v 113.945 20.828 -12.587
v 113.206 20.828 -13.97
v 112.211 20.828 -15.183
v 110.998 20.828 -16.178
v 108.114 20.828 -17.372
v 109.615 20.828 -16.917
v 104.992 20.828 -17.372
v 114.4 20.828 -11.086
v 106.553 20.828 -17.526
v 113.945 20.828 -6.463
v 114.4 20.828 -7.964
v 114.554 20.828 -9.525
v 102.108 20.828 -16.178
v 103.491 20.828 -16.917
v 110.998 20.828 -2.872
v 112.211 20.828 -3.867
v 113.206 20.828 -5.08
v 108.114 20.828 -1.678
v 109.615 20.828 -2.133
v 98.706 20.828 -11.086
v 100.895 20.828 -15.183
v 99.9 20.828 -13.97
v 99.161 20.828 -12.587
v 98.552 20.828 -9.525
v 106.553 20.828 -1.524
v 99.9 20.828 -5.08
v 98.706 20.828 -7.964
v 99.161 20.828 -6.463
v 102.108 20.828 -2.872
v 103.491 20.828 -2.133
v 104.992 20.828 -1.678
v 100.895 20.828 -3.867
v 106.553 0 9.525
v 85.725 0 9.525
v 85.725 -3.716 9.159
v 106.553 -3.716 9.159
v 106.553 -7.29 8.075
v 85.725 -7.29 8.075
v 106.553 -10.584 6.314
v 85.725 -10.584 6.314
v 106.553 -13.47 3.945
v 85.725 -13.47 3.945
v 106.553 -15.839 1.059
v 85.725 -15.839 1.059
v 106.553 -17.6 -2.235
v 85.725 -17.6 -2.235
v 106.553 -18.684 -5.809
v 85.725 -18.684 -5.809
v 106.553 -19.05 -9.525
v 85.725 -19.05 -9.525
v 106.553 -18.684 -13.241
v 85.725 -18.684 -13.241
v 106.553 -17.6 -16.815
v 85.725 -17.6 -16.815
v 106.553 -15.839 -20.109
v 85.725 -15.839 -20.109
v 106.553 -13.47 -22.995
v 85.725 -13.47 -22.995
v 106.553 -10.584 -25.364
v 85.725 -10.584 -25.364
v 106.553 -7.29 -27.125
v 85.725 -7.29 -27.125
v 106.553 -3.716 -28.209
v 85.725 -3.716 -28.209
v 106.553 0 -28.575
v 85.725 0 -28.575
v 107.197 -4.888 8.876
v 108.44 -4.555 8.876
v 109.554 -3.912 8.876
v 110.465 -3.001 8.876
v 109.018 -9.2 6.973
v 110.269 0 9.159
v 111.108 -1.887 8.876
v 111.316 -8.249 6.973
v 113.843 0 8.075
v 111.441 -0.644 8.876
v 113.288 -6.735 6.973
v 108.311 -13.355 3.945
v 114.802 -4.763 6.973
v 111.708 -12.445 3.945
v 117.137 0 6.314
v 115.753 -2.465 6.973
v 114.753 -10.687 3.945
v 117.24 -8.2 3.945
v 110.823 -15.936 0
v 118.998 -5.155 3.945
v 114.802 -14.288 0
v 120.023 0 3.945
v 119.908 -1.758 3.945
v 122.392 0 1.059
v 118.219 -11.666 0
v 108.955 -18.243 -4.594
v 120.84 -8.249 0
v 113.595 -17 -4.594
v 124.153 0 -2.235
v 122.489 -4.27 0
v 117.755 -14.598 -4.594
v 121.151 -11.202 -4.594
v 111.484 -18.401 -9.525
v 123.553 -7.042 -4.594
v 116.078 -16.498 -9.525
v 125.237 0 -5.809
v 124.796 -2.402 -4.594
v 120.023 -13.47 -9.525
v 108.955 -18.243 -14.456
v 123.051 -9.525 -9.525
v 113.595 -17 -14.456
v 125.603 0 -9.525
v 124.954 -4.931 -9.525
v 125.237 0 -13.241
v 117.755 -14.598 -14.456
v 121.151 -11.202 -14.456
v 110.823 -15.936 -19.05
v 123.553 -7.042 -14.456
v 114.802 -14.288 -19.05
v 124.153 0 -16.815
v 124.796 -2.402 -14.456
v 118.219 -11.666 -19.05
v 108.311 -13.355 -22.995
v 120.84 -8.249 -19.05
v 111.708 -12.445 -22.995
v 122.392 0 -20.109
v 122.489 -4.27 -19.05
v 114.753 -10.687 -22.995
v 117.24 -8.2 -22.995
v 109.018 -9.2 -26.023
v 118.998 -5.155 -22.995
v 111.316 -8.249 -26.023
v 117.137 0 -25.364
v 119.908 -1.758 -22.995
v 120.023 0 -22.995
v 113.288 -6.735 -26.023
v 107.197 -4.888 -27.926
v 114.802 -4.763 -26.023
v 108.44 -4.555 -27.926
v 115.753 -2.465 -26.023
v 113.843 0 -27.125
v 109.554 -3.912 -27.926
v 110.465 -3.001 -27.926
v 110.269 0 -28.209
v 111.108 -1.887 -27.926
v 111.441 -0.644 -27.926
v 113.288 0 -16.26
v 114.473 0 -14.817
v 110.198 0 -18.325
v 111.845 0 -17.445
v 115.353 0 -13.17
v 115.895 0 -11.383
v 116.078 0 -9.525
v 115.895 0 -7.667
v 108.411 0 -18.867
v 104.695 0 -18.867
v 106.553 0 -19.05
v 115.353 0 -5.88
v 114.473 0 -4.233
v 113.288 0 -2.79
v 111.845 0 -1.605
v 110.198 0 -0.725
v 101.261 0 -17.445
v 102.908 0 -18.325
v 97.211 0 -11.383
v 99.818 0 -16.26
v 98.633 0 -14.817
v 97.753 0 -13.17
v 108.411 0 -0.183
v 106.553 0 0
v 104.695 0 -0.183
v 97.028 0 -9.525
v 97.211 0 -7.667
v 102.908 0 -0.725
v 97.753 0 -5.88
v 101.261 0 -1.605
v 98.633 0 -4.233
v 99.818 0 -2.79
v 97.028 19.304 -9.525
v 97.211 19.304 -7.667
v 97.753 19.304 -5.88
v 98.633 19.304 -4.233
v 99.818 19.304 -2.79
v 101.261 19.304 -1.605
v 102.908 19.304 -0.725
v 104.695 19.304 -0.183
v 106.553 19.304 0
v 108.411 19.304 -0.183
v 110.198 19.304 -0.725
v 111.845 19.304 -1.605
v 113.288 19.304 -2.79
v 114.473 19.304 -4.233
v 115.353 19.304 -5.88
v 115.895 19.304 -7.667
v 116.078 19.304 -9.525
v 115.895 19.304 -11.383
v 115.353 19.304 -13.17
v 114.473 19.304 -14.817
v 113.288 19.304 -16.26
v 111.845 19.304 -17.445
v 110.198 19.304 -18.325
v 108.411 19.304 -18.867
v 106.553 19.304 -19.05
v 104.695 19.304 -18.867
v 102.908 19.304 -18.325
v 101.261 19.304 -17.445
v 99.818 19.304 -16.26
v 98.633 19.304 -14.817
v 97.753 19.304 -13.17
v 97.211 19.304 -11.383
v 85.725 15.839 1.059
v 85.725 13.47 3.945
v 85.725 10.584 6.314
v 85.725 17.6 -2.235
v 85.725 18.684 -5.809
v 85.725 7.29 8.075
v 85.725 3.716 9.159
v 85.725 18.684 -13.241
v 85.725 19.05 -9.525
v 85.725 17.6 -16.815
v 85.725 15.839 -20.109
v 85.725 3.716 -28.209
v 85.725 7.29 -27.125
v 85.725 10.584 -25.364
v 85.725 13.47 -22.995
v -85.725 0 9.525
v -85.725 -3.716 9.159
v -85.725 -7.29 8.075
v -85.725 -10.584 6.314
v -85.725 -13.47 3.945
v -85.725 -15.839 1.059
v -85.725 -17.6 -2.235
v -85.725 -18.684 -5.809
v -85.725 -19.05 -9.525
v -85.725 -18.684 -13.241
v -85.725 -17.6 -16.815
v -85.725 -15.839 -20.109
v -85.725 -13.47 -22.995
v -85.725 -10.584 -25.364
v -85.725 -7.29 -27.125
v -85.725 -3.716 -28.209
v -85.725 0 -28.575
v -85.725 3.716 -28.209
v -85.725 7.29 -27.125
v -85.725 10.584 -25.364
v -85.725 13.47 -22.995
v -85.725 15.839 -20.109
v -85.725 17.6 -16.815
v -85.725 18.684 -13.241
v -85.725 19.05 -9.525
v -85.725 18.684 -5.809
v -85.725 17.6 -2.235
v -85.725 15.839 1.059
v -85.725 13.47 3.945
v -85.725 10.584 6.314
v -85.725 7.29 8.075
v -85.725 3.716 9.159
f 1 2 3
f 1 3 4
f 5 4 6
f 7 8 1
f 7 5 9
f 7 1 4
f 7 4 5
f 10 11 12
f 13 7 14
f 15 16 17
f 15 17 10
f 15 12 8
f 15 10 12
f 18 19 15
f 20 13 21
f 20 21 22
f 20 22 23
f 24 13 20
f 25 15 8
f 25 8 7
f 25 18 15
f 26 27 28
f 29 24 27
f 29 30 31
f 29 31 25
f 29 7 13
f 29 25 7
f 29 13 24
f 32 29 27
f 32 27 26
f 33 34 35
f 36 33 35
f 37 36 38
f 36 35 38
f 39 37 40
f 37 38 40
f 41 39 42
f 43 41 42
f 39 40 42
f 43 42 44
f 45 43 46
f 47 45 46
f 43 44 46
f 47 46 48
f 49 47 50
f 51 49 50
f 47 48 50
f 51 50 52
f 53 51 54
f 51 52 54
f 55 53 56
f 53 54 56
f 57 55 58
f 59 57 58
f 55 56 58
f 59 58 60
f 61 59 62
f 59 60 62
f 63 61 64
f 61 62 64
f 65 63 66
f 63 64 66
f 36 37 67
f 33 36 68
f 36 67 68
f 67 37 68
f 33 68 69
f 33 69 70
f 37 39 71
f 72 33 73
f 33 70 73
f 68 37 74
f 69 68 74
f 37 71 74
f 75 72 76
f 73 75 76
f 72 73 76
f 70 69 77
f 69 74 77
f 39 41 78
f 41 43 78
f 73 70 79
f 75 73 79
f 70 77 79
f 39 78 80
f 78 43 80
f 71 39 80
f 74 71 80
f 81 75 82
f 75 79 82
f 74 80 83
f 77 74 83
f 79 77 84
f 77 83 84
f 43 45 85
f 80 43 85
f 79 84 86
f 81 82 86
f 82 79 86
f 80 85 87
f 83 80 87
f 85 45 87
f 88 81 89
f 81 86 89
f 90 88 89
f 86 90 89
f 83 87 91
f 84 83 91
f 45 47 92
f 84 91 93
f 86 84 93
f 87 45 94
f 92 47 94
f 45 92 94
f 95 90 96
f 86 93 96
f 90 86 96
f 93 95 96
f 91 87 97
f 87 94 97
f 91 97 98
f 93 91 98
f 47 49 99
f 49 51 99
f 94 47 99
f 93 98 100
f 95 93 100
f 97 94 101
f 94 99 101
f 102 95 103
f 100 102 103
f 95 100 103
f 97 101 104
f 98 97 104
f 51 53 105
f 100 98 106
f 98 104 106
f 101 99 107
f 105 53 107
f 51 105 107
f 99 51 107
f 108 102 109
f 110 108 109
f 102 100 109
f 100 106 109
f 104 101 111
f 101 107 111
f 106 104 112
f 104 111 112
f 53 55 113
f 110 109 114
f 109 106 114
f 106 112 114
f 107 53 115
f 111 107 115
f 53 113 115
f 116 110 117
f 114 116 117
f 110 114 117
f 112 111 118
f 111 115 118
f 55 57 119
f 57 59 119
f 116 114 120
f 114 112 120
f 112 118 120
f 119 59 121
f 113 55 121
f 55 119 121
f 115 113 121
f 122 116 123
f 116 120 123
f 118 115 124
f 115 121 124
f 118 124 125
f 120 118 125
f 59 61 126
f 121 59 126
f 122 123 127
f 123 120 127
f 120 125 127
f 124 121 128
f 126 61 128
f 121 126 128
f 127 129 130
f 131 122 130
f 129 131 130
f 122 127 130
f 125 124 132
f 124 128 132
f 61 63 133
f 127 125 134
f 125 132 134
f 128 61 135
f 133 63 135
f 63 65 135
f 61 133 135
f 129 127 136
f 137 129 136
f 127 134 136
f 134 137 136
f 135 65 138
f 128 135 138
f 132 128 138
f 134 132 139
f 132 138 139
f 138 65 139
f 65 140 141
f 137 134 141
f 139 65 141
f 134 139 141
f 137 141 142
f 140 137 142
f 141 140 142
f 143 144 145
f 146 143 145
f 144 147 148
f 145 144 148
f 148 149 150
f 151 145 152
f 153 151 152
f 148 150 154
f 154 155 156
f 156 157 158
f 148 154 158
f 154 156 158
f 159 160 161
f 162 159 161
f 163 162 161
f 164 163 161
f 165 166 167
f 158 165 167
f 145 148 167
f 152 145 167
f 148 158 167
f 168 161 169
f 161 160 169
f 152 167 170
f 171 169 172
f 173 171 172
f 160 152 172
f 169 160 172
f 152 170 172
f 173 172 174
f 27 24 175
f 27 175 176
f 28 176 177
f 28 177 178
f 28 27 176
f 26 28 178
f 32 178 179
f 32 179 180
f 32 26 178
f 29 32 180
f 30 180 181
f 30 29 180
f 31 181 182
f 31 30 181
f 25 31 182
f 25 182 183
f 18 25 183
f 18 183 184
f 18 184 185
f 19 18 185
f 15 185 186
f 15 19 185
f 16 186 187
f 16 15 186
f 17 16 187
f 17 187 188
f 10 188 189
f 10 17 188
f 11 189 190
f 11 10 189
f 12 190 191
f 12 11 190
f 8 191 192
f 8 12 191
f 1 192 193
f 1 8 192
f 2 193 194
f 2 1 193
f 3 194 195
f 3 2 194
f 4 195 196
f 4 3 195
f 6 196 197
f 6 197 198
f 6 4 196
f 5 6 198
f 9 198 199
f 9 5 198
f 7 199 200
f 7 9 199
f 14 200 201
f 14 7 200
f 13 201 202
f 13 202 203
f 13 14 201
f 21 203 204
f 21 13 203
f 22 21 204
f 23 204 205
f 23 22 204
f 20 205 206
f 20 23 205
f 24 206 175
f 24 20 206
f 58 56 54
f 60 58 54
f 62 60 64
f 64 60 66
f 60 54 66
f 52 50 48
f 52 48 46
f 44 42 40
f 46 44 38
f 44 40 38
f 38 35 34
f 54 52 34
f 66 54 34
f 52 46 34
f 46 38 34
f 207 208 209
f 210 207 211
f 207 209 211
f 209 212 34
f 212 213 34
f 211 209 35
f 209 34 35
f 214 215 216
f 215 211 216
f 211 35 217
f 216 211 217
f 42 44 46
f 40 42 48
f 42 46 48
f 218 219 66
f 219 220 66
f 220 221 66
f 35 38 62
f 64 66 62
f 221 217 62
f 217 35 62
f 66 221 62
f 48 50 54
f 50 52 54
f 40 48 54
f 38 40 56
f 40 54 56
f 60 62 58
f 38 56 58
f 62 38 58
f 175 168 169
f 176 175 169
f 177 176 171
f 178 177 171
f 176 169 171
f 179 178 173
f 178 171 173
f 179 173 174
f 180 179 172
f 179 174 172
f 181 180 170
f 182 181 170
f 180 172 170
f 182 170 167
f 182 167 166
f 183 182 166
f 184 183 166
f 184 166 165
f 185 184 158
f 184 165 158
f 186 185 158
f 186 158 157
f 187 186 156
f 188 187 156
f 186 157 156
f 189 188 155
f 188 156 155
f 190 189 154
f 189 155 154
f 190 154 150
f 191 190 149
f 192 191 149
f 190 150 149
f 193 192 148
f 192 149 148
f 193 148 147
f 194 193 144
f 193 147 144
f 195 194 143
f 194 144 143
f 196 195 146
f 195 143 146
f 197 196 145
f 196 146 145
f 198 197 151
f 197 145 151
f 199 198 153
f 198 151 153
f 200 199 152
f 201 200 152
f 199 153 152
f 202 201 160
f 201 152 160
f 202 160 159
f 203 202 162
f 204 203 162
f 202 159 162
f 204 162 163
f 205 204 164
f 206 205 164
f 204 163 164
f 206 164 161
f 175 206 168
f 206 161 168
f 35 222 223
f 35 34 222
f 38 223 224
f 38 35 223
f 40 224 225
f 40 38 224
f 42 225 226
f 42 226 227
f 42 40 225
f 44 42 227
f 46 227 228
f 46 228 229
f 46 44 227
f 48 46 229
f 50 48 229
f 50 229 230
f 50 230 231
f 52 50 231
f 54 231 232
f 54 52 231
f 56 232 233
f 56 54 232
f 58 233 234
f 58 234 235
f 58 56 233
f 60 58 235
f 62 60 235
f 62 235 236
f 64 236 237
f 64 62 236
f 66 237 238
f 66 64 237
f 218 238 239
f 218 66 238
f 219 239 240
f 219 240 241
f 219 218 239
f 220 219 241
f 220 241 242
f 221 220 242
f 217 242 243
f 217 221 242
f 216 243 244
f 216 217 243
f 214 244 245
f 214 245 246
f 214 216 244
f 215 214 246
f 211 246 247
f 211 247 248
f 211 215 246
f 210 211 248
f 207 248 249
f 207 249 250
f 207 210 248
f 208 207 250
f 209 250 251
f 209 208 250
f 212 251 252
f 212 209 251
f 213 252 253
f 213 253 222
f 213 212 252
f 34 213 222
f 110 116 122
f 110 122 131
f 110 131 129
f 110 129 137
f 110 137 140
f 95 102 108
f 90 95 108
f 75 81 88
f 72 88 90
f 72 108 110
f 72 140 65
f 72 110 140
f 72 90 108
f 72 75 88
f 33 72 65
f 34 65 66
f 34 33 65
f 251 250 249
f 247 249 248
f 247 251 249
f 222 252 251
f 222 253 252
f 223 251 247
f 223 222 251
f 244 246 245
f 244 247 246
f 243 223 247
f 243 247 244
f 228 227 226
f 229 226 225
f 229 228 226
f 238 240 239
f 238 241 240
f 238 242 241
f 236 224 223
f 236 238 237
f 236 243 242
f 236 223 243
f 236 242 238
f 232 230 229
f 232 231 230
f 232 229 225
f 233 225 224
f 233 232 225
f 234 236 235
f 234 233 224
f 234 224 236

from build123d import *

# Parameters (mm, degrees)
F0_W     = 171.45
F0_H     = 19.05
F3_DEPTH = 20.828
F5_ANGLE = 90
F6_R     = 9.525
F7_DEPTH = 20.828
F8_SIZE  = 1.524


with BuildPart() as f1:
    # F0 (on Front) → F1 (revolve)
    with BuildSketch(Plane.XZ):
        Rectangle(F0_W, F0_H)
    revolve(axis=Axis((0, 0, -9.525), (1, 0, 0)))


with BuildPart() as f3:
    # F2 (on face) → F3 (new body)
    with BuildSketch(Plane.YZ.offset(85.725)):
        with BuildLine():
            Line((0, -28.575), (0, 9.525))
            ThreePointArc((0, 9.525), (-19.05, -9.525), (0, -28.575))
        make_face()
    extrude(amount=F3_DEPTH)

    # F4 (on face) → F5 (revolve)
    with BuildSketch(Plane.YZ.offset(106.553)):
        with BuildLine():
            ThreePointArc((0, 9.525), (-19.05, -9.525), (0, -28.575))
            Line((0, -28.575), (0, 9.525))
        make_face()
    revolve(axis=Axis((106.553, 0, -9.525), (0, 0, 1)), revolution_arc=F5_ANGLE)


with BuildPart() as f7:
    # F6 (on face) → F7 (new body)
    with BuildSketch(Plane(origin=(0, 0, 0), x_dir=(-1, 0, 0), z_dir=(0, 1, 0))):
        with Locations((-106.553, -9.525)):
            Circle(F6_R)
    extrude(amount=F7_DEPTH)

    # F8
    f8_edges = [f7.edges().sort_by_distance(p)[0] for p in [
        (116.078, 20.828, -9.525),
    ]]
    chamfer(f8_edges, length=F8_SIZE)


solid = Compound([f1.part, f3.part, f7.part])
